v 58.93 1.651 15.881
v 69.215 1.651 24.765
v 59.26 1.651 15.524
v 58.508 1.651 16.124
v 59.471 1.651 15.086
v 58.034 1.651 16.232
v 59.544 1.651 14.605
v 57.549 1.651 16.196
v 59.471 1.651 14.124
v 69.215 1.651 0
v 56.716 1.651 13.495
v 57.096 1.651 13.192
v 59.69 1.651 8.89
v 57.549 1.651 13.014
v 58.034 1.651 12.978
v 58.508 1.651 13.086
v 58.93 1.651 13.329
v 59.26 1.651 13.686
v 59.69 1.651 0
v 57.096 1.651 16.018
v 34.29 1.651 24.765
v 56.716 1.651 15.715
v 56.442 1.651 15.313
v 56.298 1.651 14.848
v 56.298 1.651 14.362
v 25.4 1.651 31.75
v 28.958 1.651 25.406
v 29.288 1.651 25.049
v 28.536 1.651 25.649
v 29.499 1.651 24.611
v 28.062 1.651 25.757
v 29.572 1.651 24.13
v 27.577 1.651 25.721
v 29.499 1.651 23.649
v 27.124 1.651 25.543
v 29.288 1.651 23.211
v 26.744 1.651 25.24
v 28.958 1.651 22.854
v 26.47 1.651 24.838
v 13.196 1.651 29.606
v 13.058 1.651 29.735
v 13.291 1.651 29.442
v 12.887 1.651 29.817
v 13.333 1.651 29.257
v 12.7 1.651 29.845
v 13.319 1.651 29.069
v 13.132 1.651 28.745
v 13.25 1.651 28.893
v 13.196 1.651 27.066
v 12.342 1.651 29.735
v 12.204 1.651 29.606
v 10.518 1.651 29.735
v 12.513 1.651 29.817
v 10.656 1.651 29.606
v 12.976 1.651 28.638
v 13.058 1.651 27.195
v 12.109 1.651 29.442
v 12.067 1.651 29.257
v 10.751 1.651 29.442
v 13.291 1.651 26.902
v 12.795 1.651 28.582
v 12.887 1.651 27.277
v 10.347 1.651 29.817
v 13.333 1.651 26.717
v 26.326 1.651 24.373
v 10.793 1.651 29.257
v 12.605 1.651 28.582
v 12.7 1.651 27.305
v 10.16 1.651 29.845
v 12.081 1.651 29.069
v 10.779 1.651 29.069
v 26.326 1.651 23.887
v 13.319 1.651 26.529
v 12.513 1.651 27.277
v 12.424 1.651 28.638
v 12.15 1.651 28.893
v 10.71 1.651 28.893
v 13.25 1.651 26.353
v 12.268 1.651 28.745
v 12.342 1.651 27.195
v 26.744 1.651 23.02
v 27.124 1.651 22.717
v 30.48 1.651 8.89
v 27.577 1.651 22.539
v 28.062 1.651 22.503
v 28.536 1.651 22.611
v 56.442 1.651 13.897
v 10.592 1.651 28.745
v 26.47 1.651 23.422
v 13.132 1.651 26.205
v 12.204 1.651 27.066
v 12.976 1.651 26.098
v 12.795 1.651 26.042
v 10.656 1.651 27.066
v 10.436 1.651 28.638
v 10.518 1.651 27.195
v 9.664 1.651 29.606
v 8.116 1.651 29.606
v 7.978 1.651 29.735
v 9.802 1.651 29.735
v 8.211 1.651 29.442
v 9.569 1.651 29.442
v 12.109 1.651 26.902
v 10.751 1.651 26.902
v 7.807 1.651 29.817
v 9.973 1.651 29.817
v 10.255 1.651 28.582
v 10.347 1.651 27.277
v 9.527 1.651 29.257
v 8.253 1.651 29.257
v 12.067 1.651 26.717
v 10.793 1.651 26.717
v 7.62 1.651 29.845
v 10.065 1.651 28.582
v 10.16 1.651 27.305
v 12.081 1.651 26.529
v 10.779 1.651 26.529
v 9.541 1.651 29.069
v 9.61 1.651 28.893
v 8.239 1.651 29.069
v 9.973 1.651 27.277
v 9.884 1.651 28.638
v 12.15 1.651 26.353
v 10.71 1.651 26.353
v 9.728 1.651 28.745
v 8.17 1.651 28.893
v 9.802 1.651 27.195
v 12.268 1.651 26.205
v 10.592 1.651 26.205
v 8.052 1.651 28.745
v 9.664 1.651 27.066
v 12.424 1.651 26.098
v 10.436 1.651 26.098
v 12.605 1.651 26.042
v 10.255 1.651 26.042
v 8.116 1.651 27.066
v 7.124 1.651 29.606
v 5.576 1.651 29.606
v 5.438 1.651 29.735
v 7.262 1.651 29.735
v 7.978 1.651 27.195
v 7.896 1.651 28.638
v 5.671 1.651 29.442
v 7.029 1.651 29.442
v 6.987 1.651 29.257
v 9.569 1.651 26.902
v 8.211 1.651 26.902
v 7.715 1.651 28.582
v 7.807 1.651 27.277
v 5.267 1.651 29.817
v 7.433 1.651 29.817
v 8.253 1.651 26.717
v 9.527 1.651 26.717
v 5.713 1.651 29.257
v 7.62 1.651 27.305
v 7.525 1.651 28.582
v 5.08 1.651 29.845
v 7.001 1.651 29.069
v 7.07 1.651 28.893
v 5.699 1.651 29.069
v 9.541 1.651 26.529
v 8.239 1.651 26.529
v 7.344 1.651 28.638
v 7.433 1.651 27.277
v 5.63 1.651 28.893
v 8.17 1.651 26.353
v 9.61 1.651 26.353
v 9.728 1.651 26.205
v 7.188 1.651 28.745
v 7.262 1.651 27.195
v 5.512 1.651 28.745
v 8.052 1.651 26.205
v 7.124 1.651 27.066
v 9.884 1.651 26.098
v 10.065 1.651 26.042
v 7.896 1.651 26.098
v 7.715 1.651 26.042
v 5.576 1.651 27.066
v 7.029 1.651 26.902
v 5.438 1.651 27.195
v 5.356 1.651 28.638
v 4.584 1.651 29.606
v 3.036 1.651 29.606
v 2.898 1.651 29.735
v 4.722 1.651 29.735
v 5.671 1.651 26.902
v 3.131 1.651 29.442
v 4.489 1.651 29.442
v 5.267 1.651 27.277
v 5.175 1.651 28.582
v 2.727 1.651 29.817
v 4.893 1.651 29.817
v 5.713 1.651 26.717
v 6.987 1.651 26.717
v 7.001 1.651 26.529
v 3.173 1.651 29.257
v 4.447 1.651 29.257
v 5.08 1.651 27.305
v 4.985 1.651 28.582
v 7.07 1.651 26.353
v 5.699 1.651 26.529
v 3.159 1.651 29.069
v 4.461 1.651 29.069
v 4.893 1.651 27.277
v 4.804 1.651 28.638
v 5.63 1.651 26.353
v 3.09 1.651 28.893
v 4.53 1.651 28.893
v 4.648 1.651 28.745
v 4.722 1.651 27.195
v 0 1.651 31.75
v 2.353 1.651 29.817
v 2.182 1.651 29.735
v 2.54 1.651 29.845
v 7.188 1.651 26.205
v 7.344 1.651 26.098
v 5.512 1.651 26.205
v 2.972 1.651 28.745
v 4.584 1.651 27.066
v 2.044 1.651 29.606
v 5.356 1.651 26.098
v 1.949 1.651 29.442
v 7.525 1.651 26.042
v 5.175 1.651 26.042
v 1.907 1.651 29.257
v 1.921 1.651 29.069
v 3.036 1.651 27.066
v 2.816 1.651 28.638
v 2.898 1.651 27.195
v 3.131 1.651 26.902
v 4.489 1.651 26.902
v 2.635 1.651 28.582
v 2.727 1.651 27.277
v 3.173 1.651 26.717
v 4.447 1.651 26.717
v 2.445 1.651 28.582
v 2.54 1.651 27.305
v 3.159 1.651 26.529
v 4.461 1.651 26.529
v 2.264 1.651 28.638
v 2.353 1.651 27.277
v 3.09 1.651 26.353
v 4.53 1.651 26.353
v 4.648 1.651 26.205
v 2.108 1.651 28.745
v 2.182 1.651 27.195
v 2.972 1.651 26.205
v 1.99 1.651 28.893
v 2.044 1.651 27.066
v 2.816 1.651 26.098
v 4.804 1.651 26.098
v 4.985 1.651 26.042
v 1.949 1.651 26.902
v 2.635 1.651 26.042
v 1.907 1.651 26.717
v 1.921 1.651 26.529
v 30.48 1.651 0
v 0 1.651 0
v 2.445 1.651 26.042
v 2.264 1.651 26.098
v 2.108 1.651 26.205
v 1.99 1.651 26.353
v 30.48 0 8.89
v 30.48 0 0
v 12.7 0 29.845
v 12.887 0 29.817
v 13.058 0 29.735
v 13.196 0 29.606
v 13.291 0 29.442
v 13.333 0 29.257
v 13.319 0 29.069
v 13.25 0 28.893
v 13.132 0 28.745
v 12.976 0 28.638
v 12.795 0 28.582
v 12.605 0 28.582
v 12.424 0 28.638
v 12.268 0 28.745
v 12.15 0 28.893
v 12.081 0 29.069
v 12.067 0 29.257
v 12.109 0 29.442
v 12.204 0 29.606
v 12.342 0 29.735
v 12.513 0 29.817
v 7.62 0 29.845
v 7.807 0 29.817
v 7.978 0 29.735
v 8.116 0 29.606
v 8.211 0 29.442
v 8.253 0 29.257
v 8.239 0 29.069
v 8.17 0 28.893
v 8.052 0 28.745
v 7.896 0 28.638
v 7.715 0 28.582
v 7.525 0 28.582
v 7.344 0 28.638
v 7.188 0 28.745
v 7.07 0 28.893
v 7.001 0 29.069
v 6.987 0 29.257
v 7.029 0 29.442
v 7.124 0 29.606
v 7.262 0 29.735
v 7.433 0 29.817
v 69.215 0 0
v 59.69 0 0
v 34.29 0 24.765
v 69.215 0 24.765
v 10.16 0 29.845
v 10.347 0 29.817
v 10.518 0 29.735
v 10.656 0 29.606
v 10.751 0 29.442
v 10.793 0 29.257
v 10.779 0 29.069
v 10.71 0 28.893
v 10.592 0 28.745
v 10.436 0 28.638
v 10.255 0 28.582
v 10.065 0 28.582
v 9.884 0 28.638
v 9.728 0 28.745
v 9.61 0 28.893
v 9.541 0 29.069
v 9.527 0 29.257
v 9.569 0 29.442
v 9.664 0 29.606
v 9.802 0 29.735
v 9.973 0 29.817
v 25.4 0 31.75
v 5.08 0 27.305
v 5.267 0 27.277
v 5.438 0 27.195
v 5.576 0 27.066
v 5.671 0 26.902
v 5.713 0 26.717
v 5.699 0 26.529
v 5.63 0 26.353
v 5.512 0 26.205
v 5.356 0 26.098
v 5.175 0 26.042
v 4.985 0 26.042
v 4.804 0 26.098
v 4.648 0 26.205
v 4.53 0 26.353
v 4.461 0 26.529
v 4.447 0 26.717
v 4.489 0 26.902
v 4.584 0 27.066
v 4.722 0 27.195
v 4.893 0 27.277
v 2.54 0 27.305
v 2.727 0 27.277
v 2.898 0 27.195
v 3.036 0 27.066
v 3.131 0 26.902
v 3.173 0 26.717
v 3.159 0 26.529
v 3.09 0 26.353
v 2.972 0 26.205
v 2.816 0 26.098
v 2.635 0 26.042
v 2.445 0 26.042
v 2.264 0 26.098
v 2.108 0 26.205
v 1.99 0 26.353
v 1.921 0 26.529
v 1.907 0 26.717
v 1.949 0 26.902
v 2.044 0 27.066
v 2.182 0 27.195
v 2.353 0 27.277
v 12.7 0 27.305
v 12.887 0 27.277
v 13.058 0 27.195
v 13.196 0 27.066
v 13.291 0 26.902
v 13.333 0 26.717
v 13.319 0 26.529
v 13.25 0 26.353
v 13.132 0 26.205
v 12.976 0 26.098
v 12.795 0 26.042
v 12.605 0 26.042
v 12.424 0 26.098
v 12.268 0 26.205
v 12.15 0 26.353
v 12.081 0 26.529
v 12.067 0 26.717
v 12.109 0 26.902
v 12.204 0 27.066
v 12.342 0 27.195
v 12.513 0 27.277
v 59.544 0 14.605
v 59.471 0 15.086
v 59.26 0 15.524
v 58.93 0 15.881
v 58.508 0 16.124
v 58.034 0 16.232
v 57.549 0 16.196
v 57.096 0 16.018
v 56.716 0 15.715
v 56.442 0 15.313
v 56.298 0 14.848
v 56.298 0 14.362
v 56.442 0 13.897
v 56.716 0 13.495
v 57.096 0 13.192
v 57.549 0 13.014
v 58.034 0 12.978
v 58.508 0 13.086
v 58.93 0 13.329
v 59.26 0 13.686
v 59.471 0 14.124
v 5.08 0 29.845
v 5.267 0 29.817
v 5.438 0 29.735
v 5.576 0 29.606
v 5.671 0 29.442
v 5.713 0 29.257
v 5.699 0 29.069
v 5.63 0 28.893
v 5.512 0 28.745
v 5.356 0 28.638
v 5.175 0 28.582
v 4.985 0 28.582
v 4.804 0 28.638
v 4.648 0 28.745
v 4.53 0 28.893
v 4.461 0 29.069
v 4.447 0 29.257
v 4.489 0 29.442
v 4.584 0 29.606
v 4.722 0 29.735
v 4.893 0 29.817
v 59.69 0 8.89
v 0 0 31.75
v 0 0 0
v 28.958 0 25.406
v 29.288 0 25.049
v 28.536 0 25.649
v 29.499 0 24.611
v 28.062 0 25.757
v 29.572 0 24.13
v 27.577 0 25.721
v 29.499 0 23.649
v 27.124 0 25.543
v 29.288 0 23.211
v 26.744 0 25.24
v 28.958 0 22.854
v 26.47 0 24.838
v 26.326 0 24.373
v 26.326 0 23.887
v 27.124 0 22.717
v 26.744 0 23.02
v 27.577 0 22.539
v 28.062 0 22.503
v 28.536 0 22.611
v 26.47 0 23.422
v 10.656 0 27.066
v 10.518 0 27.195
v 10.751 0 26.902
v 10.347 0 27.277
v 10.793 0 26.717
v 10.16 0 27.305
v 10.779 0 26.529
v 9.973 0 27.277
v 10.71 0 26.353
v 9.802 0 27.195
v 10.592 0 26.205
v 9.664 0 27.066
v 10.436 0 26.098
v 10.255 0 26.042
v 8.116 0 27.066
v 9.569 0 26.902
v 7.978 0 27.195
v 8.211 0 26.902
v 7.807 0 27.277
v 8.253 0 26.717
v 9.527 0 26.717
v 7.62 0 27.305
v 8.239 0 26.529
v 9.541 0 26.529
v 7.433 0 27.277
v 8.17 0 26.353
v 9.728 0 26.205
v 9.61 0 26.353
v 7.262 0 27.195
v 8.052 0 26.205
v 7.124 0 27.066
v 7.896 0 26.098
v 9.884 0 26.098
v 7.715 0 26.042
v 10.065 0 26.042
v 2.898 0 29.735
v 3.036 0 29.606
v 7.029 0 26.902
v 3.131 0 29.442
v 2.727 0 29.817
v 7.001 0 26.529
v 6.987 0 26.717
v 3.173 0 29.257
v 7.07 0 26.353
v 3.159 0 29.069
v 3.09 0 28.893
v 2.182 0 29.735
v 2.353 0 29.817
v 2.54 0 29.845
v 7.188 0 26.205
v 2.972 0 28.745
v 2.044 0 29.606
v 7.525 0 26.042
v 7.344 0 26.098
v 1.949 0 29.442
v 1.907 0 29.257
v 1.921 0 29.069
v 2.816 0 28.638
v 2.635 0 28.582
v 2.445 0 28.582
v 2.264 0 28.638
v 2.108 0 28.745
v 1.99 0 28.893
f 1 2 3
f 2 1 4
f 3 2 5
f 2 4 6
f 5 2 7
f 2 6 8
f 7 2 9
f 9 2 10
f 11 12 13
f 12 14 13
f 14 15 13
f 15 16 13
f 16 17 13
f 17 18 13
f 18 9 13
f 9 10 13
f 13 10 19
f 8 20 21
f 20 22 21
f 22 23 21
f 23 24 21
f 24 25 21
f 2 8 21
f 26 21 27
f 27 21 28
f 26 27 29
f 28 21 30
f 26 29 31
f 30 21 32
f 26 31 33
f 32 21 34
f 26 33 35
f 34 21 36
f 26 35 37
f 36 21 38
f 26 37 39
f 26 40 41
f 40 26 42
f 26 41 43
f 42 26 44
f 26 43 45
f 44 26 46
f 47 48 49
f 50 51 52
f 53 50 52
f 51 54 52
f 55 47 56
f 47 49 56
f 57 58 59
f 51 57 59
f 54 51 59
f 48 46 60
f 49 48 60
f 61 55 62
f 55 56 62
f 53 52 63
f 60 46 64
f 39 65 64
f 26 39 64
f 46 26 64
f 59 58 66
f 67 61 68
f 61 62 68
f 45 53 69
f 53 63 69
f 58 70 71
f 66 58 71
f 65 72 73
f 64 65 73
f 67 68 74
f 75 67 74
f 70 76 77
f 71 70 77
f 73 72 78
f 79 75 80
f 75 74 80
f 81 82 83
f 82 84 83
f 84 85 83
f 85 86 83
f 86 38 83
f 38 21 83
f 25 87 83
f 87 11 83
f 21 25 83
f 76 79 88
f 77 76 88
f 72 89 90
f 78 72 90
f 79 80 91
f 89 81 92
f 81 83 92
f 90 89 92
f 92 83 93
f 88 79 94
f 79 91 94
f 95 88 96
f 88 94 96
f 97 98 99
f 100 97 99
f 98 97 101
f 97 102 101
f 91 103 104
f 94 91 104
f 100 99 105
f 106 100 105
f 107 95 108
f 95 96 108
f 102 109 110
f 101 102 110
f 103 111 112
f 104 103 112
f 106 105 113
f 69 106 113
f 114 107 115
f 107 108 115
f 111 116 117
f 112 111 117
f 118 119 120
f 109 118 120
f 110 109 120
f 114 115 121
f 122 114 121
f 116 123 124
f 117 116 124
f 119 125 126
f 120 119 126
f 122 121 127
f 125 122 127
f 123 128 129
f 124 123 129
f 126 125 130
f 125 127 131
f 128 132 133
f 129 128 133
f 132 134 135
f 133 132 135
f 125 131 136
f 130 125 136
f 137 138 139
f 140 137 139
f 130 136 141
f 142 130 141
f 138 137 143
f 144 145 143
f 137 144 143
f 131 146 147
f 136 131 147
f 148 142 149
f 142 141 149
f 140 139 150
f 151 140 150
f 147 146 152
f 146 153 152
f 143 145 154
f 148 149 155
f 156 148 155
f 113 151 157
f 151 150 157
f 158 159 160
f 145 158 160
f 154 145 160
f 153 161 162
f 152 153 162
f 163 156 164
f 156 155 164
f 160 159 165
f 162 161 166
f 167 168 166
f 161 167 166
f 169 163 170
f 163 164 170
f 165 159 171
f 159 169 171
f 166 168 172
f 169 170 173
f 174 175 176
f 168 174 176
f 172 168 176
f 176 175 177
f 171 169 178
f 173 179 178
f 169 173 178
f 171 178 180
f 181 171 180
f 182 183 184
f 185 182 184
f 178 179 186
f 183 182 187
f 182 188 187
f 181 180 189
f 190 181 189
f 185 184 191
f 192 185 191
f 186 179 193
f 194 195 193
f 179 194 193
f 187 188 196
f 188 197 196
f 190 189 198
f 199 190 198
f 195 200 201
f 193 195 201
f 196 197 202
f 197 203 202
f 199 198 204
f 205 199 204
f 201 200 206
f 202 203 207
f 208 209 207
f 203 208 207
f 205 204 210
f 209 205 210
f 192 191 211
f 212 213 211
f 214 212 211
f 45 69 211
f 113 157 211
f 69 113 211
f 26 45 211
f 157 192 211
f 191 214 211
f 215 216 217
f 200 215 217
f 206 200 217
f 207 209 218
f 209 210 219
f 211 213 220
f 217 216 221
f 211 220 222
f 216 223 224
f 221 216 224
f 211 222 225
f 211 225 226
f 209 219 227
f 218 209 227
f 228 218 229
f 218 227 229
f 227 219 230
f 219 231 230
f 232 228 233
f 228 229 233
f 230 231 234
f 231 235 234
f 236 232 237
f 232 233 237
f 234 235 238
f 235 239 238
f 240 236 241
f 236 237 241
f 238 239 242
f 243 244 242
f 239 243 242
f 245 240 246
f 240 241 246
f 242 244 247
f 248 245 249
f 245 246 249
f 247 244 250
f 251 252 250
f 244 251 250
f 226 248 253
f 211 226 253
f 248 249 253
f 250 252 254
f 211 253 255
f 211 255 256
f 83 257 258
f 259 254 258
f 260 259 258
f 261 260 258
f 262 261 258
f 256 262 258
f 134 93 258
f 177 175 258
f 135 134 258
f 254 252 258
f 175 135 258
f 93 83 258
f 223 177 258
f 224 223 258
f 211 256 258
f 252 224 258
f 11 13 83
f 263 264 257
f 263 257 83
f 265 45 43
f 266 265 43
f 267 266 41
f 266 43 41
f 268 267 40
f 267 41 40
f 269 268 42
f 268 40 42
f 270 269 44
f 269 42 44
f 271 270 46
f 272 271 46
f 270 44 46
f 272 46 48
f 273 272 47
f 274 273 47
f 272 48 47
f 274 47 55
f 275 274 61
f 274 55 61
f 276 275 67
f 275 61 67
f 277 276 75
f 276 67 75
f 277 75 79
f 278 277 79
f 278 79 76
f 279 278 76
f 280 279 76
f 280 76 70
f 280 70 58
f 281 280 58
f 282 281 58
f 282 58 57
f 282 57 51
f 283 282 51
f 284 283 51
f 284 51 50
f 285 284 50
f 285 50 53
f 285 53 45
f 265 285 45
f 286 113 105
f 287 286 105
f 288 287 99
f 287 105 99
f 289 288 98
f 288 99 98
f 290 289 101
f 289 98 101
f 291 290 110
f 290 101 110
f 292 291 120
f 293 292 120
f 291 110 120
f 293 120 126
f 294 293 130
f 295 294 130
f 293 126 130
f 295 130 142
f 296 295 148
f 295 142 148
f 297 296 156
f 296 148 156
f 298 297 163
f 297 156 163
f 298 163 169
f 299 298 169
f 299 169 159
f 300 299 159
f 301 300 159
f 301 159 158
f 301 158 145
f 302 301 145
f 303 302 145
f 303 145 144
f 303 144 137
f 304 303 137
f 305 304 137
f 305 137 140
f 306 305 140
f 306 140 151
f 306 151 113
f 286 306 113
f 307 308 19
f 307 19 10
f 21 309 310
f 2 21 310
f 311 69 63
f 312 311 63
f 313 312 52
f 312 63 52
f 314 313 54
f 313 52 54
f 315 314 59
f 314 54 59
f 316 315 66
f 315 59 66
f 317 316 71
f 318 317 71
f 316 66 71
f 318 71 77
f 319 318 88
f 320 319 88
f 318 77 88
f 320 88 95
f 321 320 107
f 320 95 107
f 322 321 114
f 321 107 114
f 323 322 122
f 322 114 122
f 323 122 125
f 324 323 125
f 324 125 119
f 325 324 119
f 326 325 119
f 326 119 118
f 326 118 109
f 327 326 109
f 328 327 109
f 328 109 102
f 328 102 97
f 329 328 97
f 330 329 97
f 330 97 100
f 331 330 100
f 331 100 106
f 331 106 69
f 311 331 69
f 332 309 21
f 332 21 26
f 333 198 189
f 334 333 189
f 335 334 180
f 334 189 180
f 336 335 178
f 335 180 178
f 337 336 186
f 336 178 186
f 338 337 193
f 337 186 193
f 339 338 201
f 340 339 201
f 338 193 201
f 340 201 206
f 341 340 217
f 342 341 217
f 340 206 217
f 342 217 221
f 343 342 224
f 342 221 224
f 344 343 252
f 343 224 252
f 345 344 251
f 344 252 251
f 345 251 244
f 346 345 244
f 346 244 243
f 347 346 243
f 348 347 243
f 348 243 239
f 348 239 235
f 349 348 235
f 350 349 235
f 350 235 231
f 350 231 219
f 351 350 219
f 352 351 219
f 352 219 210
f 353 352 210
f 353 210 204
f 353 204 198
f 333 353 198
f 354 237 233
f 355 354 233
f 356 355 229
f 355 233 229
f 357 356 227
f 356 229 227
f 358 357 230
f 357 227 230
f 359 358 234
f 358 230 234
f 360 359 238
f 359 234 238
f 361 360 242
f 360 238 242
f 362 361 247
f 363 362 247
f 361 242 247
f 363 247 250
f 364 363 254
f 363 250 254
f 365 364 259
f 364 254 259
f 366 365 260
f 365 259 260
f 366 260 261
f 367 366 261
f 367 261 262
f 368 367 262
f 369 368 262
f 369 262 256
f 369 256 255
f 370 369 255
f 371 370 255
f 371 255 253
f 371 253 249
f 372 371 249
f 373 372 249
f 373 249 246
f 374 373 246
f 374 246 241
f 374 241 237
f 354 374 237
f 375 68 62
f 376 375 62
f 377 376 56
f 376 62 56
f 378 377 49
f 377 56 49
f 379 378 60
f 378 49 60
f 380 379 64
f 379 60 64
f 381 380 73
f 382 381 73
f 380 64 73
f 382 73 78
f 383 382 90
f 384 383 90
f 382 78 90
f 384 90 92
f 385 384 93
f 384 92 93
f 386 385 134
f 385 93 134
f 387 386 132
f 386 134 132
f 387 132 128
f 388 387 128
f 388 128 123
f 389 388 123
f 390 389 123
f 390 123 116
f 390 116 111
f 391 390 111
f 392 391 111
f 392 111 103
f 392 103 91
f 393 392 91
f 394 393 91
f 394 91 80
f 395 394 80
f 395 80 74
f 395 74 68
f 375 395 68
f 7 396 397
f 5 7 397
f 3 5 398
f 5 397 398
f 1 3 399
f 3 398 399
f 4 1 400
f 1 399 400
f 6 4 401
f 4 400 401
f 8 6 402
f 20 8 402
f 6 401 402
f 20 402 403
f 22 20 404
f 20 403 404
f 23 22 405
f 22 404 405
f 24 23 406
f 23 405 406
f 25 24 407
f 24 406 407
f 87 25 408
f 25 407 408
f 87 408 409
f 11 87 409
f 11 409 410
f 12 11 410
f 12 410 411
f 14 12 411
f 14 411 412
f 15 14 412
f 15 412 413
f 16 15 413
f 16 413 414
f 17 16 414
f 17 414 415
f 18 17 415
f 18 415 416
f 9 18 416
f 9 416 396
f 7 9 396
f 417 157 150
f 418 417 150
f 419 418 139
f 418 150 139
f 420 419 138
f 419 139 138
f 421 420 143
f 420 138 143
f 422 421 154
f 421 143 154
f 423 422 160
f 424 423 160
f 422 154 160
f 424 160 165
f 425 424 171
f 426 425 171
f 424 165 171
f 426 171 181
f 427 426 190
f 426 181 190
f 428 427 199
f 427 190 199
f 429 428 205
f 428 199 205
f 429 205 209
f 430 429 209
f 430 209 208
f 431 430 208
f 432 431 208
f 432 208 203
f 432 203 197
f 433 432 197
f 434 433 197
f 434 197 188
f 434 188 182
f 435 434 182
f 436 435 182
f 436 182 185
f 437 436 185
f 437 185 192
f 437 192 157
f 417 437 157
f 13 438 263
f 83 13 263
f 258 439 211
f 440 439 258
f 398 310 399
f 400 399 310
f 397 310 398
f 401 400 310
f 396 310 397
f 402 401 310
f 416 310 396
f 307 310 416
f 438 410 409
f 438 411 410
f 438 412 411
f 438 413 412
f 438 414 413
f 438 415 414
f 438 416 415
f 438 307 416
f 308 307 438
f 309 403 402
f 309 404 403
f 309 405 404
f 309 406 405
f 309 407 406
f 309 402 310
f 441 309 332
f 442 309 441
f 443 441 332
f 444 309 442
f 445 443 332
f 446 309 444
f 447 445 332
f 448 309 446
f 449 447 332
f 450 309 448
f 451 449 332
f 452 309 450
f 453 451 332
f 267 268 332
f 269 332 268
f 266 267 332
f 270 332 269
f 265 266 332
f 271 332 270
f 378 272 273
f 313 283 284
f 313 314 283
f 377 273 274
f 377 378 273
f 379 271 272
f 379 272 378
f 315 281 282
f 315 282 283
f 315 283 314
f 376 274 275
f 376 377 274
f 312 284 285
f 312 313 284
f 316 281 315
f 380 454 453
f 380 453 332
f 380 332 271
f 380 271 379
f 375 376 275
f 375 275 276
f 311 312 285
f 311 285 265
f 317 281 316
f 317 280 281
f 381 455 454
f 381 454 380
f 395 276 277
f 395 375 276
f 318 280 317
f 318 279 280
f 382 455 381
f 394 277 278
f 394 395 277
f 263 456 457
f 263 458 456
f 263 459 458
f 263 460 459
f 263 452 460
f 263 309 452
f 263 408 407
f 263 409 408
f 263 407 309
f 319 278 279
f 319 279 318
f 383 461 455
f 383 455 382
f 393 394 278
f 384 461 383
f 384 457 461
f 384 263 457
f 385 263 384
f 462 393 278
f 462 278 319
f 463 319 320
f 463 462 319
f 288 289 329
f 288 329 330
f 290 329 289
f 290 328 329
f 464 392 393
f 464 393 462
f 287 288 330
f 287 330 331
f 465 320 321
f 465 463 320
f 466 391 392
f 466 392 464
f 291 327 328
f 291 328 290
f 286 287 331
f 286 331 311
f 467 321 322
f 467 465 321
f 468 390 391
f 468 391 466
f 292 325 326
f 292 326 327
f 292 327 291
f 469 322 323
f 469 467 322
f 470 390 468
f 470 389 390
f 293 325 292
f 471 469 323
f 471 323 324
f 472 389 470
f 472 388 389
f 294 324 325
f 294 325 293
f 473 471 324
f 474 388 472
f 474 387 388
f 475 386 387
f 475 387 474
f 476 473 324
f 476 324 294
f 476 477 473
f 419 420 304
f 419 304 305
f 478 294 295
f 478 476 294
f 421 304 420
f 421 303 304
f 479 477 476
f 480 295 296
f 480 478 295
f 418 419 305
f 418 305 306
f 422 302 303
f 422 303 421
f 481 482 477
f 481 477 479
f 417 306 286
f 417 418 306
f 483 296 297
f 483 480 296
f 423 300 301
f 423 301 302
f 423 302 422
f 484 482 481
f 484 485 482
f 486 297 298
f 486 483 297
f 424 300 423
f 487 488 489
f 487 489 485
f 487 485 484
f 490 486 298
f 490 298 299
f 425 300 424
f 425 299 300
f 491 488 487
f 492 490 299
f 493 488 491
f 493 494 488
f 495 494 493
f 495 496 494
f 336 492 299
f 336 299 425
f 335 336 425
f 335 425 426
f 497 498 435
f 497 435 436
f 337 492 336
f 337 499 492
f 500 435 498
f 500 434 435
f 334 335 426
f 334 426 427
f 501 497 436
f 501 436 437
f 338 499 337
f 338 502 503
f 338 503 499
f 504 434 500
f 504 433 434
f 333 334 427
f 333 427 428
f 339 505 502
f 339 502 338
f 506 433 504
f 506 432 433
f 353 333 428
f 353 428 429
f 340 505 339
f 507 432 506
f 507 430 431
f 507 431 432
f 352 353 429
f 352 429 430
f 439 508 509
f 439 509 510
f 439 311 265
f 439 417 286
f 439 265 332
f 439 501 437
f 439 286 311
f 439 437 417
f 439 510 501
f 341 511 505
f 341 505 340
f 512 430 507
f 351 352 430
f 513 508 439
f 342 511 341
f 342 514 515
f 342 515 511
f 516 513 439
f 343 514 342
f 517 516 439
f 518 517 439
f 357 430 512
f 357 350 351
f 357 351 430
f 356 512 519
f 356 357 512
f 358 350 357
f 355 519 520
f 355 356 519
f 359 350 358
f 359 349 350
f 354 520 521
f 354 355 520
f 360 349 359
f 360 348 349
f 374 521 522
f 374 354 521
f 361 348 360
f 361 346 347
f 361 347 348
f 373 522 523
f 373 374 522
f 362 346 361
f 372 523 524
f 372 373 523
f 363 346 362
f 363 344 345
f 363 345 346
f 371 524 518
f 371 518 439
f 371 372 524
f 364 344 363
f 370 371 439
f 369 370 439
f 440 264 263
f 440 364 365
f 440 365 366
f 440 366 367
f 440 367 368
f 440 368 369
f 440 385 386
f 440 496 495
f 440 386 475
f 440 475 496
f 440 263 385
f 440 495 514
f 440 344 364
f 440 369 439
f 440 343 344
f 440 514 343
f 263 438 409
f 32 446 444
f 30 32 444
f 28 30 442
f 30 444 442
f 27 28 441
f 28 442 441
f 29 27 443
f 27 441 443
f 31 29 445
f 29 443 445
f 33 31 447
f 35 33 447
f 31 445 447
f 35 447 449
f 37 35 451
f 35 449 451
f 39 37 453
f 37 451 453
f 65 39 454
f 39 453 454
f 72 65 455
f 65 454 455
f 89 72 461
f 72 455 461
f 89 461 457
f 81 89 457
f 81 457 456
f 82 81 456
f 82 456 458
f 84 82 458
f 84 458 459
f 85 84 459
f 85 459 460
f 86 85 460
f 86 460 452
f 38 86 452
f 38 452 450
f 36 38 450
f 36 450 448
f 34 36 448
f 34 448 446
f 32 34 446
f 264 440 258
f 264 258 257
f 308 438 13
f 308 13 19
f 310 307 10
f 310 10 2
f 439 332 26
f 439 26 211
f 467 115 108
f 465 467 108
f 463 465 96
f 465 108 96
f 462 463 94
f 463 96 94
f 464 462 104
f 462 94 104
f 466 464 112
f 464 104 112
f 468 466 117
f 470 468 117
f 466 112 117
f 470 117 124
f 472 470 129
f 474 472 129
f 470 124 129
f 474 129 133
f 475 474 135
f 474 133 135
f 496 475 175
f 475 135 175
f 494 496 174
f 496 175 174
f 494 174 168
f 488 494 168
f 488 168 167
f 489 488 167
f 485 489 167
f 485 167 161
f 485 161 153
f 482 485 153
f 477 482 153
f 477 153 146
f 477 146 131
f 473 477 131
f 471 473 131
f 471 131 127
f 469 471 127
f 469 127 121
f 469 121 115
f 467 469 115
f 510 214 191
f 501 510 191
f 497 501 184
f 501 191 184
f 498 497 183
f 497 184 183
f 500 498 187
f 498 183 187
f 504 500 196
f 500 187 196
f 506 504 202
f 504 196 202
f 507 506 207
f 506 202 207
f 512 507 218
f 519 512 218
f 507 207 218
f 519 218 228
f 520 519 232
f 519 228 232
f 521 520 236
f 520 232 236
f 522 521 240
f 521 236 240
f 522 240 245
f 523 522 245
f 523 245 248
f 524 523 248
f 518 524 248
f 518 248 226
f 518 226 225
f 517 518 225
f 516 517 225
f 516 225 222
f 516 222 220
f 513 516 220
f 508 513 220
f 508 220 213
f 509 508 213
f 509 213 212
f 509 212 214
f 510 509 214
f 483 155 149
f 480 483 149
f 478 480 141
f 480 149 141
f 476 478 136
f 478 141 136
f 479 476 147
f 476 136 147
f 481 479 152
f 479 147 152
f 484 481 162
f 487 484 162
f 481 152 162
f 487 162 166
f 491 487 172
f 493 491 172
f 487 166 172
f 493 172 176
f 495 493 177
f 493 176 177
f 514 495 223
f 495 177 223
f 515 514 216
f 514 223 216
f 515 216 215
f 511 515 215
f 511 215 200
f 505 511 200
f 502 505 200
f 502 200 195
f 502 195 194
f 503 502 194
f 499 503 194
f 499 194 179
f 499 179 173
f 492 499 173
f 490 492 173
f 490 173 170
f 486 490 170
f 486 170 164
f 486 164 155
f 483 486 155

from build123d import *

# Parameters (mm, degrees)
BOSS_EXTRUDE1_DEPTH   = 1.651
SKETCH5_R             = 0.635
CUT_EXTRUDE2_DEPTH    = 2.651
F_4_CLEARANCE_HOLE1_D = 3.2639


with BuildPart() as part:
    # Sketch1 → Boss-Extrude1 (new body)
    with BuildSketch(Plane(origin=(0, 0, 0), x_dir=(1, 0, 0), z_dir=(0, 1, 0))):
        Polygon((0, 0), (30.48, 0), (30.48, -8.89), (45.085, -8.89), (59.69, -8.89), (59.69, 0), (69.215, 0), (69.215, -24.765), (45.085, -24.765), (34.29, -24.765), (25.4, -31.75), (0, -31.75), align=None)
    extrude(amount=BOSS_EXTRUDE1_DEPTH)

    # Sketch5 → Cut-Extrude2 (cut, through all)
    with BuildSketch(Plane(origin=(0, 1.651, 0), x_dir=(1, 0, 0), z_dir=(0, 1, 0))):
        with Locations(Location((2.54, -29.21, 0), (0, 0, 270))):  # turned: the seam where the file's is
            Circle(SKETCH5_R)
        with Locations(Location((5.08, -29.21, 0), (0, 0, 270))):  # turned: the seam where the file's is
            Circle(SKETCH5_R)
        with Locations(Location((7.62, -29.21, 0), (0, 0, 270))):  # turned: the seam where the file's is
            Circle(SKETCH5_R)
        with Locations(Location((10.16, -29.21, 0), (0, 0, 270))):  # turned: the seam where the file's is
            Circle(SKETCH5_R)
        with Locations(Location((12.7, -29.21, 0), (0, 0, 270))):  # turned: the seam where the file's is
            Circle(SKETCH5_R)
        with Locations(Location((2.54, -26.67, 0), (0, 0, 270))):  # turned: the seam where the file's is
            Circle(SKETCH5_R)
        with Locations(Location((5.08, -26.67, 0), (0, 0, 270))):  # turned: the seam where the file's is
            Circle(SKETCH5_R)
        with Locations(Location((7.62, -26.67, 0), (0, 0, 270))):  # turned: the seam where the file's is
            Circle(SKETCH5_R)
        with Locations(Location((10.16, -26.67, 0), (0, 0, 270))):  # turned: the seam where the file's is
            Circle(SKETCH5_R)
        with Locations(Location((12.7, -26.67, 0), (0, 0, 270))):  # turned: the seam where the file's is
            Circle(SKETCH5_R)
    extrude(amount=-CUT_EXTRUDE2_DEPTH, mode=Mode.SUBTRACT)

    # #4 Clearance Hole1 (through all)
    with Locations(Plane(origin=(0, 1.651, 0), x_dir=(-1, 0, 0), z_dir=(0, 1, 0))):
        with Locations((-27.94, 24.13), (-57.912, 14.605)):
            Hole(F_4_CLEARANCE_HOLE1_D / 2)


solid = part.part
